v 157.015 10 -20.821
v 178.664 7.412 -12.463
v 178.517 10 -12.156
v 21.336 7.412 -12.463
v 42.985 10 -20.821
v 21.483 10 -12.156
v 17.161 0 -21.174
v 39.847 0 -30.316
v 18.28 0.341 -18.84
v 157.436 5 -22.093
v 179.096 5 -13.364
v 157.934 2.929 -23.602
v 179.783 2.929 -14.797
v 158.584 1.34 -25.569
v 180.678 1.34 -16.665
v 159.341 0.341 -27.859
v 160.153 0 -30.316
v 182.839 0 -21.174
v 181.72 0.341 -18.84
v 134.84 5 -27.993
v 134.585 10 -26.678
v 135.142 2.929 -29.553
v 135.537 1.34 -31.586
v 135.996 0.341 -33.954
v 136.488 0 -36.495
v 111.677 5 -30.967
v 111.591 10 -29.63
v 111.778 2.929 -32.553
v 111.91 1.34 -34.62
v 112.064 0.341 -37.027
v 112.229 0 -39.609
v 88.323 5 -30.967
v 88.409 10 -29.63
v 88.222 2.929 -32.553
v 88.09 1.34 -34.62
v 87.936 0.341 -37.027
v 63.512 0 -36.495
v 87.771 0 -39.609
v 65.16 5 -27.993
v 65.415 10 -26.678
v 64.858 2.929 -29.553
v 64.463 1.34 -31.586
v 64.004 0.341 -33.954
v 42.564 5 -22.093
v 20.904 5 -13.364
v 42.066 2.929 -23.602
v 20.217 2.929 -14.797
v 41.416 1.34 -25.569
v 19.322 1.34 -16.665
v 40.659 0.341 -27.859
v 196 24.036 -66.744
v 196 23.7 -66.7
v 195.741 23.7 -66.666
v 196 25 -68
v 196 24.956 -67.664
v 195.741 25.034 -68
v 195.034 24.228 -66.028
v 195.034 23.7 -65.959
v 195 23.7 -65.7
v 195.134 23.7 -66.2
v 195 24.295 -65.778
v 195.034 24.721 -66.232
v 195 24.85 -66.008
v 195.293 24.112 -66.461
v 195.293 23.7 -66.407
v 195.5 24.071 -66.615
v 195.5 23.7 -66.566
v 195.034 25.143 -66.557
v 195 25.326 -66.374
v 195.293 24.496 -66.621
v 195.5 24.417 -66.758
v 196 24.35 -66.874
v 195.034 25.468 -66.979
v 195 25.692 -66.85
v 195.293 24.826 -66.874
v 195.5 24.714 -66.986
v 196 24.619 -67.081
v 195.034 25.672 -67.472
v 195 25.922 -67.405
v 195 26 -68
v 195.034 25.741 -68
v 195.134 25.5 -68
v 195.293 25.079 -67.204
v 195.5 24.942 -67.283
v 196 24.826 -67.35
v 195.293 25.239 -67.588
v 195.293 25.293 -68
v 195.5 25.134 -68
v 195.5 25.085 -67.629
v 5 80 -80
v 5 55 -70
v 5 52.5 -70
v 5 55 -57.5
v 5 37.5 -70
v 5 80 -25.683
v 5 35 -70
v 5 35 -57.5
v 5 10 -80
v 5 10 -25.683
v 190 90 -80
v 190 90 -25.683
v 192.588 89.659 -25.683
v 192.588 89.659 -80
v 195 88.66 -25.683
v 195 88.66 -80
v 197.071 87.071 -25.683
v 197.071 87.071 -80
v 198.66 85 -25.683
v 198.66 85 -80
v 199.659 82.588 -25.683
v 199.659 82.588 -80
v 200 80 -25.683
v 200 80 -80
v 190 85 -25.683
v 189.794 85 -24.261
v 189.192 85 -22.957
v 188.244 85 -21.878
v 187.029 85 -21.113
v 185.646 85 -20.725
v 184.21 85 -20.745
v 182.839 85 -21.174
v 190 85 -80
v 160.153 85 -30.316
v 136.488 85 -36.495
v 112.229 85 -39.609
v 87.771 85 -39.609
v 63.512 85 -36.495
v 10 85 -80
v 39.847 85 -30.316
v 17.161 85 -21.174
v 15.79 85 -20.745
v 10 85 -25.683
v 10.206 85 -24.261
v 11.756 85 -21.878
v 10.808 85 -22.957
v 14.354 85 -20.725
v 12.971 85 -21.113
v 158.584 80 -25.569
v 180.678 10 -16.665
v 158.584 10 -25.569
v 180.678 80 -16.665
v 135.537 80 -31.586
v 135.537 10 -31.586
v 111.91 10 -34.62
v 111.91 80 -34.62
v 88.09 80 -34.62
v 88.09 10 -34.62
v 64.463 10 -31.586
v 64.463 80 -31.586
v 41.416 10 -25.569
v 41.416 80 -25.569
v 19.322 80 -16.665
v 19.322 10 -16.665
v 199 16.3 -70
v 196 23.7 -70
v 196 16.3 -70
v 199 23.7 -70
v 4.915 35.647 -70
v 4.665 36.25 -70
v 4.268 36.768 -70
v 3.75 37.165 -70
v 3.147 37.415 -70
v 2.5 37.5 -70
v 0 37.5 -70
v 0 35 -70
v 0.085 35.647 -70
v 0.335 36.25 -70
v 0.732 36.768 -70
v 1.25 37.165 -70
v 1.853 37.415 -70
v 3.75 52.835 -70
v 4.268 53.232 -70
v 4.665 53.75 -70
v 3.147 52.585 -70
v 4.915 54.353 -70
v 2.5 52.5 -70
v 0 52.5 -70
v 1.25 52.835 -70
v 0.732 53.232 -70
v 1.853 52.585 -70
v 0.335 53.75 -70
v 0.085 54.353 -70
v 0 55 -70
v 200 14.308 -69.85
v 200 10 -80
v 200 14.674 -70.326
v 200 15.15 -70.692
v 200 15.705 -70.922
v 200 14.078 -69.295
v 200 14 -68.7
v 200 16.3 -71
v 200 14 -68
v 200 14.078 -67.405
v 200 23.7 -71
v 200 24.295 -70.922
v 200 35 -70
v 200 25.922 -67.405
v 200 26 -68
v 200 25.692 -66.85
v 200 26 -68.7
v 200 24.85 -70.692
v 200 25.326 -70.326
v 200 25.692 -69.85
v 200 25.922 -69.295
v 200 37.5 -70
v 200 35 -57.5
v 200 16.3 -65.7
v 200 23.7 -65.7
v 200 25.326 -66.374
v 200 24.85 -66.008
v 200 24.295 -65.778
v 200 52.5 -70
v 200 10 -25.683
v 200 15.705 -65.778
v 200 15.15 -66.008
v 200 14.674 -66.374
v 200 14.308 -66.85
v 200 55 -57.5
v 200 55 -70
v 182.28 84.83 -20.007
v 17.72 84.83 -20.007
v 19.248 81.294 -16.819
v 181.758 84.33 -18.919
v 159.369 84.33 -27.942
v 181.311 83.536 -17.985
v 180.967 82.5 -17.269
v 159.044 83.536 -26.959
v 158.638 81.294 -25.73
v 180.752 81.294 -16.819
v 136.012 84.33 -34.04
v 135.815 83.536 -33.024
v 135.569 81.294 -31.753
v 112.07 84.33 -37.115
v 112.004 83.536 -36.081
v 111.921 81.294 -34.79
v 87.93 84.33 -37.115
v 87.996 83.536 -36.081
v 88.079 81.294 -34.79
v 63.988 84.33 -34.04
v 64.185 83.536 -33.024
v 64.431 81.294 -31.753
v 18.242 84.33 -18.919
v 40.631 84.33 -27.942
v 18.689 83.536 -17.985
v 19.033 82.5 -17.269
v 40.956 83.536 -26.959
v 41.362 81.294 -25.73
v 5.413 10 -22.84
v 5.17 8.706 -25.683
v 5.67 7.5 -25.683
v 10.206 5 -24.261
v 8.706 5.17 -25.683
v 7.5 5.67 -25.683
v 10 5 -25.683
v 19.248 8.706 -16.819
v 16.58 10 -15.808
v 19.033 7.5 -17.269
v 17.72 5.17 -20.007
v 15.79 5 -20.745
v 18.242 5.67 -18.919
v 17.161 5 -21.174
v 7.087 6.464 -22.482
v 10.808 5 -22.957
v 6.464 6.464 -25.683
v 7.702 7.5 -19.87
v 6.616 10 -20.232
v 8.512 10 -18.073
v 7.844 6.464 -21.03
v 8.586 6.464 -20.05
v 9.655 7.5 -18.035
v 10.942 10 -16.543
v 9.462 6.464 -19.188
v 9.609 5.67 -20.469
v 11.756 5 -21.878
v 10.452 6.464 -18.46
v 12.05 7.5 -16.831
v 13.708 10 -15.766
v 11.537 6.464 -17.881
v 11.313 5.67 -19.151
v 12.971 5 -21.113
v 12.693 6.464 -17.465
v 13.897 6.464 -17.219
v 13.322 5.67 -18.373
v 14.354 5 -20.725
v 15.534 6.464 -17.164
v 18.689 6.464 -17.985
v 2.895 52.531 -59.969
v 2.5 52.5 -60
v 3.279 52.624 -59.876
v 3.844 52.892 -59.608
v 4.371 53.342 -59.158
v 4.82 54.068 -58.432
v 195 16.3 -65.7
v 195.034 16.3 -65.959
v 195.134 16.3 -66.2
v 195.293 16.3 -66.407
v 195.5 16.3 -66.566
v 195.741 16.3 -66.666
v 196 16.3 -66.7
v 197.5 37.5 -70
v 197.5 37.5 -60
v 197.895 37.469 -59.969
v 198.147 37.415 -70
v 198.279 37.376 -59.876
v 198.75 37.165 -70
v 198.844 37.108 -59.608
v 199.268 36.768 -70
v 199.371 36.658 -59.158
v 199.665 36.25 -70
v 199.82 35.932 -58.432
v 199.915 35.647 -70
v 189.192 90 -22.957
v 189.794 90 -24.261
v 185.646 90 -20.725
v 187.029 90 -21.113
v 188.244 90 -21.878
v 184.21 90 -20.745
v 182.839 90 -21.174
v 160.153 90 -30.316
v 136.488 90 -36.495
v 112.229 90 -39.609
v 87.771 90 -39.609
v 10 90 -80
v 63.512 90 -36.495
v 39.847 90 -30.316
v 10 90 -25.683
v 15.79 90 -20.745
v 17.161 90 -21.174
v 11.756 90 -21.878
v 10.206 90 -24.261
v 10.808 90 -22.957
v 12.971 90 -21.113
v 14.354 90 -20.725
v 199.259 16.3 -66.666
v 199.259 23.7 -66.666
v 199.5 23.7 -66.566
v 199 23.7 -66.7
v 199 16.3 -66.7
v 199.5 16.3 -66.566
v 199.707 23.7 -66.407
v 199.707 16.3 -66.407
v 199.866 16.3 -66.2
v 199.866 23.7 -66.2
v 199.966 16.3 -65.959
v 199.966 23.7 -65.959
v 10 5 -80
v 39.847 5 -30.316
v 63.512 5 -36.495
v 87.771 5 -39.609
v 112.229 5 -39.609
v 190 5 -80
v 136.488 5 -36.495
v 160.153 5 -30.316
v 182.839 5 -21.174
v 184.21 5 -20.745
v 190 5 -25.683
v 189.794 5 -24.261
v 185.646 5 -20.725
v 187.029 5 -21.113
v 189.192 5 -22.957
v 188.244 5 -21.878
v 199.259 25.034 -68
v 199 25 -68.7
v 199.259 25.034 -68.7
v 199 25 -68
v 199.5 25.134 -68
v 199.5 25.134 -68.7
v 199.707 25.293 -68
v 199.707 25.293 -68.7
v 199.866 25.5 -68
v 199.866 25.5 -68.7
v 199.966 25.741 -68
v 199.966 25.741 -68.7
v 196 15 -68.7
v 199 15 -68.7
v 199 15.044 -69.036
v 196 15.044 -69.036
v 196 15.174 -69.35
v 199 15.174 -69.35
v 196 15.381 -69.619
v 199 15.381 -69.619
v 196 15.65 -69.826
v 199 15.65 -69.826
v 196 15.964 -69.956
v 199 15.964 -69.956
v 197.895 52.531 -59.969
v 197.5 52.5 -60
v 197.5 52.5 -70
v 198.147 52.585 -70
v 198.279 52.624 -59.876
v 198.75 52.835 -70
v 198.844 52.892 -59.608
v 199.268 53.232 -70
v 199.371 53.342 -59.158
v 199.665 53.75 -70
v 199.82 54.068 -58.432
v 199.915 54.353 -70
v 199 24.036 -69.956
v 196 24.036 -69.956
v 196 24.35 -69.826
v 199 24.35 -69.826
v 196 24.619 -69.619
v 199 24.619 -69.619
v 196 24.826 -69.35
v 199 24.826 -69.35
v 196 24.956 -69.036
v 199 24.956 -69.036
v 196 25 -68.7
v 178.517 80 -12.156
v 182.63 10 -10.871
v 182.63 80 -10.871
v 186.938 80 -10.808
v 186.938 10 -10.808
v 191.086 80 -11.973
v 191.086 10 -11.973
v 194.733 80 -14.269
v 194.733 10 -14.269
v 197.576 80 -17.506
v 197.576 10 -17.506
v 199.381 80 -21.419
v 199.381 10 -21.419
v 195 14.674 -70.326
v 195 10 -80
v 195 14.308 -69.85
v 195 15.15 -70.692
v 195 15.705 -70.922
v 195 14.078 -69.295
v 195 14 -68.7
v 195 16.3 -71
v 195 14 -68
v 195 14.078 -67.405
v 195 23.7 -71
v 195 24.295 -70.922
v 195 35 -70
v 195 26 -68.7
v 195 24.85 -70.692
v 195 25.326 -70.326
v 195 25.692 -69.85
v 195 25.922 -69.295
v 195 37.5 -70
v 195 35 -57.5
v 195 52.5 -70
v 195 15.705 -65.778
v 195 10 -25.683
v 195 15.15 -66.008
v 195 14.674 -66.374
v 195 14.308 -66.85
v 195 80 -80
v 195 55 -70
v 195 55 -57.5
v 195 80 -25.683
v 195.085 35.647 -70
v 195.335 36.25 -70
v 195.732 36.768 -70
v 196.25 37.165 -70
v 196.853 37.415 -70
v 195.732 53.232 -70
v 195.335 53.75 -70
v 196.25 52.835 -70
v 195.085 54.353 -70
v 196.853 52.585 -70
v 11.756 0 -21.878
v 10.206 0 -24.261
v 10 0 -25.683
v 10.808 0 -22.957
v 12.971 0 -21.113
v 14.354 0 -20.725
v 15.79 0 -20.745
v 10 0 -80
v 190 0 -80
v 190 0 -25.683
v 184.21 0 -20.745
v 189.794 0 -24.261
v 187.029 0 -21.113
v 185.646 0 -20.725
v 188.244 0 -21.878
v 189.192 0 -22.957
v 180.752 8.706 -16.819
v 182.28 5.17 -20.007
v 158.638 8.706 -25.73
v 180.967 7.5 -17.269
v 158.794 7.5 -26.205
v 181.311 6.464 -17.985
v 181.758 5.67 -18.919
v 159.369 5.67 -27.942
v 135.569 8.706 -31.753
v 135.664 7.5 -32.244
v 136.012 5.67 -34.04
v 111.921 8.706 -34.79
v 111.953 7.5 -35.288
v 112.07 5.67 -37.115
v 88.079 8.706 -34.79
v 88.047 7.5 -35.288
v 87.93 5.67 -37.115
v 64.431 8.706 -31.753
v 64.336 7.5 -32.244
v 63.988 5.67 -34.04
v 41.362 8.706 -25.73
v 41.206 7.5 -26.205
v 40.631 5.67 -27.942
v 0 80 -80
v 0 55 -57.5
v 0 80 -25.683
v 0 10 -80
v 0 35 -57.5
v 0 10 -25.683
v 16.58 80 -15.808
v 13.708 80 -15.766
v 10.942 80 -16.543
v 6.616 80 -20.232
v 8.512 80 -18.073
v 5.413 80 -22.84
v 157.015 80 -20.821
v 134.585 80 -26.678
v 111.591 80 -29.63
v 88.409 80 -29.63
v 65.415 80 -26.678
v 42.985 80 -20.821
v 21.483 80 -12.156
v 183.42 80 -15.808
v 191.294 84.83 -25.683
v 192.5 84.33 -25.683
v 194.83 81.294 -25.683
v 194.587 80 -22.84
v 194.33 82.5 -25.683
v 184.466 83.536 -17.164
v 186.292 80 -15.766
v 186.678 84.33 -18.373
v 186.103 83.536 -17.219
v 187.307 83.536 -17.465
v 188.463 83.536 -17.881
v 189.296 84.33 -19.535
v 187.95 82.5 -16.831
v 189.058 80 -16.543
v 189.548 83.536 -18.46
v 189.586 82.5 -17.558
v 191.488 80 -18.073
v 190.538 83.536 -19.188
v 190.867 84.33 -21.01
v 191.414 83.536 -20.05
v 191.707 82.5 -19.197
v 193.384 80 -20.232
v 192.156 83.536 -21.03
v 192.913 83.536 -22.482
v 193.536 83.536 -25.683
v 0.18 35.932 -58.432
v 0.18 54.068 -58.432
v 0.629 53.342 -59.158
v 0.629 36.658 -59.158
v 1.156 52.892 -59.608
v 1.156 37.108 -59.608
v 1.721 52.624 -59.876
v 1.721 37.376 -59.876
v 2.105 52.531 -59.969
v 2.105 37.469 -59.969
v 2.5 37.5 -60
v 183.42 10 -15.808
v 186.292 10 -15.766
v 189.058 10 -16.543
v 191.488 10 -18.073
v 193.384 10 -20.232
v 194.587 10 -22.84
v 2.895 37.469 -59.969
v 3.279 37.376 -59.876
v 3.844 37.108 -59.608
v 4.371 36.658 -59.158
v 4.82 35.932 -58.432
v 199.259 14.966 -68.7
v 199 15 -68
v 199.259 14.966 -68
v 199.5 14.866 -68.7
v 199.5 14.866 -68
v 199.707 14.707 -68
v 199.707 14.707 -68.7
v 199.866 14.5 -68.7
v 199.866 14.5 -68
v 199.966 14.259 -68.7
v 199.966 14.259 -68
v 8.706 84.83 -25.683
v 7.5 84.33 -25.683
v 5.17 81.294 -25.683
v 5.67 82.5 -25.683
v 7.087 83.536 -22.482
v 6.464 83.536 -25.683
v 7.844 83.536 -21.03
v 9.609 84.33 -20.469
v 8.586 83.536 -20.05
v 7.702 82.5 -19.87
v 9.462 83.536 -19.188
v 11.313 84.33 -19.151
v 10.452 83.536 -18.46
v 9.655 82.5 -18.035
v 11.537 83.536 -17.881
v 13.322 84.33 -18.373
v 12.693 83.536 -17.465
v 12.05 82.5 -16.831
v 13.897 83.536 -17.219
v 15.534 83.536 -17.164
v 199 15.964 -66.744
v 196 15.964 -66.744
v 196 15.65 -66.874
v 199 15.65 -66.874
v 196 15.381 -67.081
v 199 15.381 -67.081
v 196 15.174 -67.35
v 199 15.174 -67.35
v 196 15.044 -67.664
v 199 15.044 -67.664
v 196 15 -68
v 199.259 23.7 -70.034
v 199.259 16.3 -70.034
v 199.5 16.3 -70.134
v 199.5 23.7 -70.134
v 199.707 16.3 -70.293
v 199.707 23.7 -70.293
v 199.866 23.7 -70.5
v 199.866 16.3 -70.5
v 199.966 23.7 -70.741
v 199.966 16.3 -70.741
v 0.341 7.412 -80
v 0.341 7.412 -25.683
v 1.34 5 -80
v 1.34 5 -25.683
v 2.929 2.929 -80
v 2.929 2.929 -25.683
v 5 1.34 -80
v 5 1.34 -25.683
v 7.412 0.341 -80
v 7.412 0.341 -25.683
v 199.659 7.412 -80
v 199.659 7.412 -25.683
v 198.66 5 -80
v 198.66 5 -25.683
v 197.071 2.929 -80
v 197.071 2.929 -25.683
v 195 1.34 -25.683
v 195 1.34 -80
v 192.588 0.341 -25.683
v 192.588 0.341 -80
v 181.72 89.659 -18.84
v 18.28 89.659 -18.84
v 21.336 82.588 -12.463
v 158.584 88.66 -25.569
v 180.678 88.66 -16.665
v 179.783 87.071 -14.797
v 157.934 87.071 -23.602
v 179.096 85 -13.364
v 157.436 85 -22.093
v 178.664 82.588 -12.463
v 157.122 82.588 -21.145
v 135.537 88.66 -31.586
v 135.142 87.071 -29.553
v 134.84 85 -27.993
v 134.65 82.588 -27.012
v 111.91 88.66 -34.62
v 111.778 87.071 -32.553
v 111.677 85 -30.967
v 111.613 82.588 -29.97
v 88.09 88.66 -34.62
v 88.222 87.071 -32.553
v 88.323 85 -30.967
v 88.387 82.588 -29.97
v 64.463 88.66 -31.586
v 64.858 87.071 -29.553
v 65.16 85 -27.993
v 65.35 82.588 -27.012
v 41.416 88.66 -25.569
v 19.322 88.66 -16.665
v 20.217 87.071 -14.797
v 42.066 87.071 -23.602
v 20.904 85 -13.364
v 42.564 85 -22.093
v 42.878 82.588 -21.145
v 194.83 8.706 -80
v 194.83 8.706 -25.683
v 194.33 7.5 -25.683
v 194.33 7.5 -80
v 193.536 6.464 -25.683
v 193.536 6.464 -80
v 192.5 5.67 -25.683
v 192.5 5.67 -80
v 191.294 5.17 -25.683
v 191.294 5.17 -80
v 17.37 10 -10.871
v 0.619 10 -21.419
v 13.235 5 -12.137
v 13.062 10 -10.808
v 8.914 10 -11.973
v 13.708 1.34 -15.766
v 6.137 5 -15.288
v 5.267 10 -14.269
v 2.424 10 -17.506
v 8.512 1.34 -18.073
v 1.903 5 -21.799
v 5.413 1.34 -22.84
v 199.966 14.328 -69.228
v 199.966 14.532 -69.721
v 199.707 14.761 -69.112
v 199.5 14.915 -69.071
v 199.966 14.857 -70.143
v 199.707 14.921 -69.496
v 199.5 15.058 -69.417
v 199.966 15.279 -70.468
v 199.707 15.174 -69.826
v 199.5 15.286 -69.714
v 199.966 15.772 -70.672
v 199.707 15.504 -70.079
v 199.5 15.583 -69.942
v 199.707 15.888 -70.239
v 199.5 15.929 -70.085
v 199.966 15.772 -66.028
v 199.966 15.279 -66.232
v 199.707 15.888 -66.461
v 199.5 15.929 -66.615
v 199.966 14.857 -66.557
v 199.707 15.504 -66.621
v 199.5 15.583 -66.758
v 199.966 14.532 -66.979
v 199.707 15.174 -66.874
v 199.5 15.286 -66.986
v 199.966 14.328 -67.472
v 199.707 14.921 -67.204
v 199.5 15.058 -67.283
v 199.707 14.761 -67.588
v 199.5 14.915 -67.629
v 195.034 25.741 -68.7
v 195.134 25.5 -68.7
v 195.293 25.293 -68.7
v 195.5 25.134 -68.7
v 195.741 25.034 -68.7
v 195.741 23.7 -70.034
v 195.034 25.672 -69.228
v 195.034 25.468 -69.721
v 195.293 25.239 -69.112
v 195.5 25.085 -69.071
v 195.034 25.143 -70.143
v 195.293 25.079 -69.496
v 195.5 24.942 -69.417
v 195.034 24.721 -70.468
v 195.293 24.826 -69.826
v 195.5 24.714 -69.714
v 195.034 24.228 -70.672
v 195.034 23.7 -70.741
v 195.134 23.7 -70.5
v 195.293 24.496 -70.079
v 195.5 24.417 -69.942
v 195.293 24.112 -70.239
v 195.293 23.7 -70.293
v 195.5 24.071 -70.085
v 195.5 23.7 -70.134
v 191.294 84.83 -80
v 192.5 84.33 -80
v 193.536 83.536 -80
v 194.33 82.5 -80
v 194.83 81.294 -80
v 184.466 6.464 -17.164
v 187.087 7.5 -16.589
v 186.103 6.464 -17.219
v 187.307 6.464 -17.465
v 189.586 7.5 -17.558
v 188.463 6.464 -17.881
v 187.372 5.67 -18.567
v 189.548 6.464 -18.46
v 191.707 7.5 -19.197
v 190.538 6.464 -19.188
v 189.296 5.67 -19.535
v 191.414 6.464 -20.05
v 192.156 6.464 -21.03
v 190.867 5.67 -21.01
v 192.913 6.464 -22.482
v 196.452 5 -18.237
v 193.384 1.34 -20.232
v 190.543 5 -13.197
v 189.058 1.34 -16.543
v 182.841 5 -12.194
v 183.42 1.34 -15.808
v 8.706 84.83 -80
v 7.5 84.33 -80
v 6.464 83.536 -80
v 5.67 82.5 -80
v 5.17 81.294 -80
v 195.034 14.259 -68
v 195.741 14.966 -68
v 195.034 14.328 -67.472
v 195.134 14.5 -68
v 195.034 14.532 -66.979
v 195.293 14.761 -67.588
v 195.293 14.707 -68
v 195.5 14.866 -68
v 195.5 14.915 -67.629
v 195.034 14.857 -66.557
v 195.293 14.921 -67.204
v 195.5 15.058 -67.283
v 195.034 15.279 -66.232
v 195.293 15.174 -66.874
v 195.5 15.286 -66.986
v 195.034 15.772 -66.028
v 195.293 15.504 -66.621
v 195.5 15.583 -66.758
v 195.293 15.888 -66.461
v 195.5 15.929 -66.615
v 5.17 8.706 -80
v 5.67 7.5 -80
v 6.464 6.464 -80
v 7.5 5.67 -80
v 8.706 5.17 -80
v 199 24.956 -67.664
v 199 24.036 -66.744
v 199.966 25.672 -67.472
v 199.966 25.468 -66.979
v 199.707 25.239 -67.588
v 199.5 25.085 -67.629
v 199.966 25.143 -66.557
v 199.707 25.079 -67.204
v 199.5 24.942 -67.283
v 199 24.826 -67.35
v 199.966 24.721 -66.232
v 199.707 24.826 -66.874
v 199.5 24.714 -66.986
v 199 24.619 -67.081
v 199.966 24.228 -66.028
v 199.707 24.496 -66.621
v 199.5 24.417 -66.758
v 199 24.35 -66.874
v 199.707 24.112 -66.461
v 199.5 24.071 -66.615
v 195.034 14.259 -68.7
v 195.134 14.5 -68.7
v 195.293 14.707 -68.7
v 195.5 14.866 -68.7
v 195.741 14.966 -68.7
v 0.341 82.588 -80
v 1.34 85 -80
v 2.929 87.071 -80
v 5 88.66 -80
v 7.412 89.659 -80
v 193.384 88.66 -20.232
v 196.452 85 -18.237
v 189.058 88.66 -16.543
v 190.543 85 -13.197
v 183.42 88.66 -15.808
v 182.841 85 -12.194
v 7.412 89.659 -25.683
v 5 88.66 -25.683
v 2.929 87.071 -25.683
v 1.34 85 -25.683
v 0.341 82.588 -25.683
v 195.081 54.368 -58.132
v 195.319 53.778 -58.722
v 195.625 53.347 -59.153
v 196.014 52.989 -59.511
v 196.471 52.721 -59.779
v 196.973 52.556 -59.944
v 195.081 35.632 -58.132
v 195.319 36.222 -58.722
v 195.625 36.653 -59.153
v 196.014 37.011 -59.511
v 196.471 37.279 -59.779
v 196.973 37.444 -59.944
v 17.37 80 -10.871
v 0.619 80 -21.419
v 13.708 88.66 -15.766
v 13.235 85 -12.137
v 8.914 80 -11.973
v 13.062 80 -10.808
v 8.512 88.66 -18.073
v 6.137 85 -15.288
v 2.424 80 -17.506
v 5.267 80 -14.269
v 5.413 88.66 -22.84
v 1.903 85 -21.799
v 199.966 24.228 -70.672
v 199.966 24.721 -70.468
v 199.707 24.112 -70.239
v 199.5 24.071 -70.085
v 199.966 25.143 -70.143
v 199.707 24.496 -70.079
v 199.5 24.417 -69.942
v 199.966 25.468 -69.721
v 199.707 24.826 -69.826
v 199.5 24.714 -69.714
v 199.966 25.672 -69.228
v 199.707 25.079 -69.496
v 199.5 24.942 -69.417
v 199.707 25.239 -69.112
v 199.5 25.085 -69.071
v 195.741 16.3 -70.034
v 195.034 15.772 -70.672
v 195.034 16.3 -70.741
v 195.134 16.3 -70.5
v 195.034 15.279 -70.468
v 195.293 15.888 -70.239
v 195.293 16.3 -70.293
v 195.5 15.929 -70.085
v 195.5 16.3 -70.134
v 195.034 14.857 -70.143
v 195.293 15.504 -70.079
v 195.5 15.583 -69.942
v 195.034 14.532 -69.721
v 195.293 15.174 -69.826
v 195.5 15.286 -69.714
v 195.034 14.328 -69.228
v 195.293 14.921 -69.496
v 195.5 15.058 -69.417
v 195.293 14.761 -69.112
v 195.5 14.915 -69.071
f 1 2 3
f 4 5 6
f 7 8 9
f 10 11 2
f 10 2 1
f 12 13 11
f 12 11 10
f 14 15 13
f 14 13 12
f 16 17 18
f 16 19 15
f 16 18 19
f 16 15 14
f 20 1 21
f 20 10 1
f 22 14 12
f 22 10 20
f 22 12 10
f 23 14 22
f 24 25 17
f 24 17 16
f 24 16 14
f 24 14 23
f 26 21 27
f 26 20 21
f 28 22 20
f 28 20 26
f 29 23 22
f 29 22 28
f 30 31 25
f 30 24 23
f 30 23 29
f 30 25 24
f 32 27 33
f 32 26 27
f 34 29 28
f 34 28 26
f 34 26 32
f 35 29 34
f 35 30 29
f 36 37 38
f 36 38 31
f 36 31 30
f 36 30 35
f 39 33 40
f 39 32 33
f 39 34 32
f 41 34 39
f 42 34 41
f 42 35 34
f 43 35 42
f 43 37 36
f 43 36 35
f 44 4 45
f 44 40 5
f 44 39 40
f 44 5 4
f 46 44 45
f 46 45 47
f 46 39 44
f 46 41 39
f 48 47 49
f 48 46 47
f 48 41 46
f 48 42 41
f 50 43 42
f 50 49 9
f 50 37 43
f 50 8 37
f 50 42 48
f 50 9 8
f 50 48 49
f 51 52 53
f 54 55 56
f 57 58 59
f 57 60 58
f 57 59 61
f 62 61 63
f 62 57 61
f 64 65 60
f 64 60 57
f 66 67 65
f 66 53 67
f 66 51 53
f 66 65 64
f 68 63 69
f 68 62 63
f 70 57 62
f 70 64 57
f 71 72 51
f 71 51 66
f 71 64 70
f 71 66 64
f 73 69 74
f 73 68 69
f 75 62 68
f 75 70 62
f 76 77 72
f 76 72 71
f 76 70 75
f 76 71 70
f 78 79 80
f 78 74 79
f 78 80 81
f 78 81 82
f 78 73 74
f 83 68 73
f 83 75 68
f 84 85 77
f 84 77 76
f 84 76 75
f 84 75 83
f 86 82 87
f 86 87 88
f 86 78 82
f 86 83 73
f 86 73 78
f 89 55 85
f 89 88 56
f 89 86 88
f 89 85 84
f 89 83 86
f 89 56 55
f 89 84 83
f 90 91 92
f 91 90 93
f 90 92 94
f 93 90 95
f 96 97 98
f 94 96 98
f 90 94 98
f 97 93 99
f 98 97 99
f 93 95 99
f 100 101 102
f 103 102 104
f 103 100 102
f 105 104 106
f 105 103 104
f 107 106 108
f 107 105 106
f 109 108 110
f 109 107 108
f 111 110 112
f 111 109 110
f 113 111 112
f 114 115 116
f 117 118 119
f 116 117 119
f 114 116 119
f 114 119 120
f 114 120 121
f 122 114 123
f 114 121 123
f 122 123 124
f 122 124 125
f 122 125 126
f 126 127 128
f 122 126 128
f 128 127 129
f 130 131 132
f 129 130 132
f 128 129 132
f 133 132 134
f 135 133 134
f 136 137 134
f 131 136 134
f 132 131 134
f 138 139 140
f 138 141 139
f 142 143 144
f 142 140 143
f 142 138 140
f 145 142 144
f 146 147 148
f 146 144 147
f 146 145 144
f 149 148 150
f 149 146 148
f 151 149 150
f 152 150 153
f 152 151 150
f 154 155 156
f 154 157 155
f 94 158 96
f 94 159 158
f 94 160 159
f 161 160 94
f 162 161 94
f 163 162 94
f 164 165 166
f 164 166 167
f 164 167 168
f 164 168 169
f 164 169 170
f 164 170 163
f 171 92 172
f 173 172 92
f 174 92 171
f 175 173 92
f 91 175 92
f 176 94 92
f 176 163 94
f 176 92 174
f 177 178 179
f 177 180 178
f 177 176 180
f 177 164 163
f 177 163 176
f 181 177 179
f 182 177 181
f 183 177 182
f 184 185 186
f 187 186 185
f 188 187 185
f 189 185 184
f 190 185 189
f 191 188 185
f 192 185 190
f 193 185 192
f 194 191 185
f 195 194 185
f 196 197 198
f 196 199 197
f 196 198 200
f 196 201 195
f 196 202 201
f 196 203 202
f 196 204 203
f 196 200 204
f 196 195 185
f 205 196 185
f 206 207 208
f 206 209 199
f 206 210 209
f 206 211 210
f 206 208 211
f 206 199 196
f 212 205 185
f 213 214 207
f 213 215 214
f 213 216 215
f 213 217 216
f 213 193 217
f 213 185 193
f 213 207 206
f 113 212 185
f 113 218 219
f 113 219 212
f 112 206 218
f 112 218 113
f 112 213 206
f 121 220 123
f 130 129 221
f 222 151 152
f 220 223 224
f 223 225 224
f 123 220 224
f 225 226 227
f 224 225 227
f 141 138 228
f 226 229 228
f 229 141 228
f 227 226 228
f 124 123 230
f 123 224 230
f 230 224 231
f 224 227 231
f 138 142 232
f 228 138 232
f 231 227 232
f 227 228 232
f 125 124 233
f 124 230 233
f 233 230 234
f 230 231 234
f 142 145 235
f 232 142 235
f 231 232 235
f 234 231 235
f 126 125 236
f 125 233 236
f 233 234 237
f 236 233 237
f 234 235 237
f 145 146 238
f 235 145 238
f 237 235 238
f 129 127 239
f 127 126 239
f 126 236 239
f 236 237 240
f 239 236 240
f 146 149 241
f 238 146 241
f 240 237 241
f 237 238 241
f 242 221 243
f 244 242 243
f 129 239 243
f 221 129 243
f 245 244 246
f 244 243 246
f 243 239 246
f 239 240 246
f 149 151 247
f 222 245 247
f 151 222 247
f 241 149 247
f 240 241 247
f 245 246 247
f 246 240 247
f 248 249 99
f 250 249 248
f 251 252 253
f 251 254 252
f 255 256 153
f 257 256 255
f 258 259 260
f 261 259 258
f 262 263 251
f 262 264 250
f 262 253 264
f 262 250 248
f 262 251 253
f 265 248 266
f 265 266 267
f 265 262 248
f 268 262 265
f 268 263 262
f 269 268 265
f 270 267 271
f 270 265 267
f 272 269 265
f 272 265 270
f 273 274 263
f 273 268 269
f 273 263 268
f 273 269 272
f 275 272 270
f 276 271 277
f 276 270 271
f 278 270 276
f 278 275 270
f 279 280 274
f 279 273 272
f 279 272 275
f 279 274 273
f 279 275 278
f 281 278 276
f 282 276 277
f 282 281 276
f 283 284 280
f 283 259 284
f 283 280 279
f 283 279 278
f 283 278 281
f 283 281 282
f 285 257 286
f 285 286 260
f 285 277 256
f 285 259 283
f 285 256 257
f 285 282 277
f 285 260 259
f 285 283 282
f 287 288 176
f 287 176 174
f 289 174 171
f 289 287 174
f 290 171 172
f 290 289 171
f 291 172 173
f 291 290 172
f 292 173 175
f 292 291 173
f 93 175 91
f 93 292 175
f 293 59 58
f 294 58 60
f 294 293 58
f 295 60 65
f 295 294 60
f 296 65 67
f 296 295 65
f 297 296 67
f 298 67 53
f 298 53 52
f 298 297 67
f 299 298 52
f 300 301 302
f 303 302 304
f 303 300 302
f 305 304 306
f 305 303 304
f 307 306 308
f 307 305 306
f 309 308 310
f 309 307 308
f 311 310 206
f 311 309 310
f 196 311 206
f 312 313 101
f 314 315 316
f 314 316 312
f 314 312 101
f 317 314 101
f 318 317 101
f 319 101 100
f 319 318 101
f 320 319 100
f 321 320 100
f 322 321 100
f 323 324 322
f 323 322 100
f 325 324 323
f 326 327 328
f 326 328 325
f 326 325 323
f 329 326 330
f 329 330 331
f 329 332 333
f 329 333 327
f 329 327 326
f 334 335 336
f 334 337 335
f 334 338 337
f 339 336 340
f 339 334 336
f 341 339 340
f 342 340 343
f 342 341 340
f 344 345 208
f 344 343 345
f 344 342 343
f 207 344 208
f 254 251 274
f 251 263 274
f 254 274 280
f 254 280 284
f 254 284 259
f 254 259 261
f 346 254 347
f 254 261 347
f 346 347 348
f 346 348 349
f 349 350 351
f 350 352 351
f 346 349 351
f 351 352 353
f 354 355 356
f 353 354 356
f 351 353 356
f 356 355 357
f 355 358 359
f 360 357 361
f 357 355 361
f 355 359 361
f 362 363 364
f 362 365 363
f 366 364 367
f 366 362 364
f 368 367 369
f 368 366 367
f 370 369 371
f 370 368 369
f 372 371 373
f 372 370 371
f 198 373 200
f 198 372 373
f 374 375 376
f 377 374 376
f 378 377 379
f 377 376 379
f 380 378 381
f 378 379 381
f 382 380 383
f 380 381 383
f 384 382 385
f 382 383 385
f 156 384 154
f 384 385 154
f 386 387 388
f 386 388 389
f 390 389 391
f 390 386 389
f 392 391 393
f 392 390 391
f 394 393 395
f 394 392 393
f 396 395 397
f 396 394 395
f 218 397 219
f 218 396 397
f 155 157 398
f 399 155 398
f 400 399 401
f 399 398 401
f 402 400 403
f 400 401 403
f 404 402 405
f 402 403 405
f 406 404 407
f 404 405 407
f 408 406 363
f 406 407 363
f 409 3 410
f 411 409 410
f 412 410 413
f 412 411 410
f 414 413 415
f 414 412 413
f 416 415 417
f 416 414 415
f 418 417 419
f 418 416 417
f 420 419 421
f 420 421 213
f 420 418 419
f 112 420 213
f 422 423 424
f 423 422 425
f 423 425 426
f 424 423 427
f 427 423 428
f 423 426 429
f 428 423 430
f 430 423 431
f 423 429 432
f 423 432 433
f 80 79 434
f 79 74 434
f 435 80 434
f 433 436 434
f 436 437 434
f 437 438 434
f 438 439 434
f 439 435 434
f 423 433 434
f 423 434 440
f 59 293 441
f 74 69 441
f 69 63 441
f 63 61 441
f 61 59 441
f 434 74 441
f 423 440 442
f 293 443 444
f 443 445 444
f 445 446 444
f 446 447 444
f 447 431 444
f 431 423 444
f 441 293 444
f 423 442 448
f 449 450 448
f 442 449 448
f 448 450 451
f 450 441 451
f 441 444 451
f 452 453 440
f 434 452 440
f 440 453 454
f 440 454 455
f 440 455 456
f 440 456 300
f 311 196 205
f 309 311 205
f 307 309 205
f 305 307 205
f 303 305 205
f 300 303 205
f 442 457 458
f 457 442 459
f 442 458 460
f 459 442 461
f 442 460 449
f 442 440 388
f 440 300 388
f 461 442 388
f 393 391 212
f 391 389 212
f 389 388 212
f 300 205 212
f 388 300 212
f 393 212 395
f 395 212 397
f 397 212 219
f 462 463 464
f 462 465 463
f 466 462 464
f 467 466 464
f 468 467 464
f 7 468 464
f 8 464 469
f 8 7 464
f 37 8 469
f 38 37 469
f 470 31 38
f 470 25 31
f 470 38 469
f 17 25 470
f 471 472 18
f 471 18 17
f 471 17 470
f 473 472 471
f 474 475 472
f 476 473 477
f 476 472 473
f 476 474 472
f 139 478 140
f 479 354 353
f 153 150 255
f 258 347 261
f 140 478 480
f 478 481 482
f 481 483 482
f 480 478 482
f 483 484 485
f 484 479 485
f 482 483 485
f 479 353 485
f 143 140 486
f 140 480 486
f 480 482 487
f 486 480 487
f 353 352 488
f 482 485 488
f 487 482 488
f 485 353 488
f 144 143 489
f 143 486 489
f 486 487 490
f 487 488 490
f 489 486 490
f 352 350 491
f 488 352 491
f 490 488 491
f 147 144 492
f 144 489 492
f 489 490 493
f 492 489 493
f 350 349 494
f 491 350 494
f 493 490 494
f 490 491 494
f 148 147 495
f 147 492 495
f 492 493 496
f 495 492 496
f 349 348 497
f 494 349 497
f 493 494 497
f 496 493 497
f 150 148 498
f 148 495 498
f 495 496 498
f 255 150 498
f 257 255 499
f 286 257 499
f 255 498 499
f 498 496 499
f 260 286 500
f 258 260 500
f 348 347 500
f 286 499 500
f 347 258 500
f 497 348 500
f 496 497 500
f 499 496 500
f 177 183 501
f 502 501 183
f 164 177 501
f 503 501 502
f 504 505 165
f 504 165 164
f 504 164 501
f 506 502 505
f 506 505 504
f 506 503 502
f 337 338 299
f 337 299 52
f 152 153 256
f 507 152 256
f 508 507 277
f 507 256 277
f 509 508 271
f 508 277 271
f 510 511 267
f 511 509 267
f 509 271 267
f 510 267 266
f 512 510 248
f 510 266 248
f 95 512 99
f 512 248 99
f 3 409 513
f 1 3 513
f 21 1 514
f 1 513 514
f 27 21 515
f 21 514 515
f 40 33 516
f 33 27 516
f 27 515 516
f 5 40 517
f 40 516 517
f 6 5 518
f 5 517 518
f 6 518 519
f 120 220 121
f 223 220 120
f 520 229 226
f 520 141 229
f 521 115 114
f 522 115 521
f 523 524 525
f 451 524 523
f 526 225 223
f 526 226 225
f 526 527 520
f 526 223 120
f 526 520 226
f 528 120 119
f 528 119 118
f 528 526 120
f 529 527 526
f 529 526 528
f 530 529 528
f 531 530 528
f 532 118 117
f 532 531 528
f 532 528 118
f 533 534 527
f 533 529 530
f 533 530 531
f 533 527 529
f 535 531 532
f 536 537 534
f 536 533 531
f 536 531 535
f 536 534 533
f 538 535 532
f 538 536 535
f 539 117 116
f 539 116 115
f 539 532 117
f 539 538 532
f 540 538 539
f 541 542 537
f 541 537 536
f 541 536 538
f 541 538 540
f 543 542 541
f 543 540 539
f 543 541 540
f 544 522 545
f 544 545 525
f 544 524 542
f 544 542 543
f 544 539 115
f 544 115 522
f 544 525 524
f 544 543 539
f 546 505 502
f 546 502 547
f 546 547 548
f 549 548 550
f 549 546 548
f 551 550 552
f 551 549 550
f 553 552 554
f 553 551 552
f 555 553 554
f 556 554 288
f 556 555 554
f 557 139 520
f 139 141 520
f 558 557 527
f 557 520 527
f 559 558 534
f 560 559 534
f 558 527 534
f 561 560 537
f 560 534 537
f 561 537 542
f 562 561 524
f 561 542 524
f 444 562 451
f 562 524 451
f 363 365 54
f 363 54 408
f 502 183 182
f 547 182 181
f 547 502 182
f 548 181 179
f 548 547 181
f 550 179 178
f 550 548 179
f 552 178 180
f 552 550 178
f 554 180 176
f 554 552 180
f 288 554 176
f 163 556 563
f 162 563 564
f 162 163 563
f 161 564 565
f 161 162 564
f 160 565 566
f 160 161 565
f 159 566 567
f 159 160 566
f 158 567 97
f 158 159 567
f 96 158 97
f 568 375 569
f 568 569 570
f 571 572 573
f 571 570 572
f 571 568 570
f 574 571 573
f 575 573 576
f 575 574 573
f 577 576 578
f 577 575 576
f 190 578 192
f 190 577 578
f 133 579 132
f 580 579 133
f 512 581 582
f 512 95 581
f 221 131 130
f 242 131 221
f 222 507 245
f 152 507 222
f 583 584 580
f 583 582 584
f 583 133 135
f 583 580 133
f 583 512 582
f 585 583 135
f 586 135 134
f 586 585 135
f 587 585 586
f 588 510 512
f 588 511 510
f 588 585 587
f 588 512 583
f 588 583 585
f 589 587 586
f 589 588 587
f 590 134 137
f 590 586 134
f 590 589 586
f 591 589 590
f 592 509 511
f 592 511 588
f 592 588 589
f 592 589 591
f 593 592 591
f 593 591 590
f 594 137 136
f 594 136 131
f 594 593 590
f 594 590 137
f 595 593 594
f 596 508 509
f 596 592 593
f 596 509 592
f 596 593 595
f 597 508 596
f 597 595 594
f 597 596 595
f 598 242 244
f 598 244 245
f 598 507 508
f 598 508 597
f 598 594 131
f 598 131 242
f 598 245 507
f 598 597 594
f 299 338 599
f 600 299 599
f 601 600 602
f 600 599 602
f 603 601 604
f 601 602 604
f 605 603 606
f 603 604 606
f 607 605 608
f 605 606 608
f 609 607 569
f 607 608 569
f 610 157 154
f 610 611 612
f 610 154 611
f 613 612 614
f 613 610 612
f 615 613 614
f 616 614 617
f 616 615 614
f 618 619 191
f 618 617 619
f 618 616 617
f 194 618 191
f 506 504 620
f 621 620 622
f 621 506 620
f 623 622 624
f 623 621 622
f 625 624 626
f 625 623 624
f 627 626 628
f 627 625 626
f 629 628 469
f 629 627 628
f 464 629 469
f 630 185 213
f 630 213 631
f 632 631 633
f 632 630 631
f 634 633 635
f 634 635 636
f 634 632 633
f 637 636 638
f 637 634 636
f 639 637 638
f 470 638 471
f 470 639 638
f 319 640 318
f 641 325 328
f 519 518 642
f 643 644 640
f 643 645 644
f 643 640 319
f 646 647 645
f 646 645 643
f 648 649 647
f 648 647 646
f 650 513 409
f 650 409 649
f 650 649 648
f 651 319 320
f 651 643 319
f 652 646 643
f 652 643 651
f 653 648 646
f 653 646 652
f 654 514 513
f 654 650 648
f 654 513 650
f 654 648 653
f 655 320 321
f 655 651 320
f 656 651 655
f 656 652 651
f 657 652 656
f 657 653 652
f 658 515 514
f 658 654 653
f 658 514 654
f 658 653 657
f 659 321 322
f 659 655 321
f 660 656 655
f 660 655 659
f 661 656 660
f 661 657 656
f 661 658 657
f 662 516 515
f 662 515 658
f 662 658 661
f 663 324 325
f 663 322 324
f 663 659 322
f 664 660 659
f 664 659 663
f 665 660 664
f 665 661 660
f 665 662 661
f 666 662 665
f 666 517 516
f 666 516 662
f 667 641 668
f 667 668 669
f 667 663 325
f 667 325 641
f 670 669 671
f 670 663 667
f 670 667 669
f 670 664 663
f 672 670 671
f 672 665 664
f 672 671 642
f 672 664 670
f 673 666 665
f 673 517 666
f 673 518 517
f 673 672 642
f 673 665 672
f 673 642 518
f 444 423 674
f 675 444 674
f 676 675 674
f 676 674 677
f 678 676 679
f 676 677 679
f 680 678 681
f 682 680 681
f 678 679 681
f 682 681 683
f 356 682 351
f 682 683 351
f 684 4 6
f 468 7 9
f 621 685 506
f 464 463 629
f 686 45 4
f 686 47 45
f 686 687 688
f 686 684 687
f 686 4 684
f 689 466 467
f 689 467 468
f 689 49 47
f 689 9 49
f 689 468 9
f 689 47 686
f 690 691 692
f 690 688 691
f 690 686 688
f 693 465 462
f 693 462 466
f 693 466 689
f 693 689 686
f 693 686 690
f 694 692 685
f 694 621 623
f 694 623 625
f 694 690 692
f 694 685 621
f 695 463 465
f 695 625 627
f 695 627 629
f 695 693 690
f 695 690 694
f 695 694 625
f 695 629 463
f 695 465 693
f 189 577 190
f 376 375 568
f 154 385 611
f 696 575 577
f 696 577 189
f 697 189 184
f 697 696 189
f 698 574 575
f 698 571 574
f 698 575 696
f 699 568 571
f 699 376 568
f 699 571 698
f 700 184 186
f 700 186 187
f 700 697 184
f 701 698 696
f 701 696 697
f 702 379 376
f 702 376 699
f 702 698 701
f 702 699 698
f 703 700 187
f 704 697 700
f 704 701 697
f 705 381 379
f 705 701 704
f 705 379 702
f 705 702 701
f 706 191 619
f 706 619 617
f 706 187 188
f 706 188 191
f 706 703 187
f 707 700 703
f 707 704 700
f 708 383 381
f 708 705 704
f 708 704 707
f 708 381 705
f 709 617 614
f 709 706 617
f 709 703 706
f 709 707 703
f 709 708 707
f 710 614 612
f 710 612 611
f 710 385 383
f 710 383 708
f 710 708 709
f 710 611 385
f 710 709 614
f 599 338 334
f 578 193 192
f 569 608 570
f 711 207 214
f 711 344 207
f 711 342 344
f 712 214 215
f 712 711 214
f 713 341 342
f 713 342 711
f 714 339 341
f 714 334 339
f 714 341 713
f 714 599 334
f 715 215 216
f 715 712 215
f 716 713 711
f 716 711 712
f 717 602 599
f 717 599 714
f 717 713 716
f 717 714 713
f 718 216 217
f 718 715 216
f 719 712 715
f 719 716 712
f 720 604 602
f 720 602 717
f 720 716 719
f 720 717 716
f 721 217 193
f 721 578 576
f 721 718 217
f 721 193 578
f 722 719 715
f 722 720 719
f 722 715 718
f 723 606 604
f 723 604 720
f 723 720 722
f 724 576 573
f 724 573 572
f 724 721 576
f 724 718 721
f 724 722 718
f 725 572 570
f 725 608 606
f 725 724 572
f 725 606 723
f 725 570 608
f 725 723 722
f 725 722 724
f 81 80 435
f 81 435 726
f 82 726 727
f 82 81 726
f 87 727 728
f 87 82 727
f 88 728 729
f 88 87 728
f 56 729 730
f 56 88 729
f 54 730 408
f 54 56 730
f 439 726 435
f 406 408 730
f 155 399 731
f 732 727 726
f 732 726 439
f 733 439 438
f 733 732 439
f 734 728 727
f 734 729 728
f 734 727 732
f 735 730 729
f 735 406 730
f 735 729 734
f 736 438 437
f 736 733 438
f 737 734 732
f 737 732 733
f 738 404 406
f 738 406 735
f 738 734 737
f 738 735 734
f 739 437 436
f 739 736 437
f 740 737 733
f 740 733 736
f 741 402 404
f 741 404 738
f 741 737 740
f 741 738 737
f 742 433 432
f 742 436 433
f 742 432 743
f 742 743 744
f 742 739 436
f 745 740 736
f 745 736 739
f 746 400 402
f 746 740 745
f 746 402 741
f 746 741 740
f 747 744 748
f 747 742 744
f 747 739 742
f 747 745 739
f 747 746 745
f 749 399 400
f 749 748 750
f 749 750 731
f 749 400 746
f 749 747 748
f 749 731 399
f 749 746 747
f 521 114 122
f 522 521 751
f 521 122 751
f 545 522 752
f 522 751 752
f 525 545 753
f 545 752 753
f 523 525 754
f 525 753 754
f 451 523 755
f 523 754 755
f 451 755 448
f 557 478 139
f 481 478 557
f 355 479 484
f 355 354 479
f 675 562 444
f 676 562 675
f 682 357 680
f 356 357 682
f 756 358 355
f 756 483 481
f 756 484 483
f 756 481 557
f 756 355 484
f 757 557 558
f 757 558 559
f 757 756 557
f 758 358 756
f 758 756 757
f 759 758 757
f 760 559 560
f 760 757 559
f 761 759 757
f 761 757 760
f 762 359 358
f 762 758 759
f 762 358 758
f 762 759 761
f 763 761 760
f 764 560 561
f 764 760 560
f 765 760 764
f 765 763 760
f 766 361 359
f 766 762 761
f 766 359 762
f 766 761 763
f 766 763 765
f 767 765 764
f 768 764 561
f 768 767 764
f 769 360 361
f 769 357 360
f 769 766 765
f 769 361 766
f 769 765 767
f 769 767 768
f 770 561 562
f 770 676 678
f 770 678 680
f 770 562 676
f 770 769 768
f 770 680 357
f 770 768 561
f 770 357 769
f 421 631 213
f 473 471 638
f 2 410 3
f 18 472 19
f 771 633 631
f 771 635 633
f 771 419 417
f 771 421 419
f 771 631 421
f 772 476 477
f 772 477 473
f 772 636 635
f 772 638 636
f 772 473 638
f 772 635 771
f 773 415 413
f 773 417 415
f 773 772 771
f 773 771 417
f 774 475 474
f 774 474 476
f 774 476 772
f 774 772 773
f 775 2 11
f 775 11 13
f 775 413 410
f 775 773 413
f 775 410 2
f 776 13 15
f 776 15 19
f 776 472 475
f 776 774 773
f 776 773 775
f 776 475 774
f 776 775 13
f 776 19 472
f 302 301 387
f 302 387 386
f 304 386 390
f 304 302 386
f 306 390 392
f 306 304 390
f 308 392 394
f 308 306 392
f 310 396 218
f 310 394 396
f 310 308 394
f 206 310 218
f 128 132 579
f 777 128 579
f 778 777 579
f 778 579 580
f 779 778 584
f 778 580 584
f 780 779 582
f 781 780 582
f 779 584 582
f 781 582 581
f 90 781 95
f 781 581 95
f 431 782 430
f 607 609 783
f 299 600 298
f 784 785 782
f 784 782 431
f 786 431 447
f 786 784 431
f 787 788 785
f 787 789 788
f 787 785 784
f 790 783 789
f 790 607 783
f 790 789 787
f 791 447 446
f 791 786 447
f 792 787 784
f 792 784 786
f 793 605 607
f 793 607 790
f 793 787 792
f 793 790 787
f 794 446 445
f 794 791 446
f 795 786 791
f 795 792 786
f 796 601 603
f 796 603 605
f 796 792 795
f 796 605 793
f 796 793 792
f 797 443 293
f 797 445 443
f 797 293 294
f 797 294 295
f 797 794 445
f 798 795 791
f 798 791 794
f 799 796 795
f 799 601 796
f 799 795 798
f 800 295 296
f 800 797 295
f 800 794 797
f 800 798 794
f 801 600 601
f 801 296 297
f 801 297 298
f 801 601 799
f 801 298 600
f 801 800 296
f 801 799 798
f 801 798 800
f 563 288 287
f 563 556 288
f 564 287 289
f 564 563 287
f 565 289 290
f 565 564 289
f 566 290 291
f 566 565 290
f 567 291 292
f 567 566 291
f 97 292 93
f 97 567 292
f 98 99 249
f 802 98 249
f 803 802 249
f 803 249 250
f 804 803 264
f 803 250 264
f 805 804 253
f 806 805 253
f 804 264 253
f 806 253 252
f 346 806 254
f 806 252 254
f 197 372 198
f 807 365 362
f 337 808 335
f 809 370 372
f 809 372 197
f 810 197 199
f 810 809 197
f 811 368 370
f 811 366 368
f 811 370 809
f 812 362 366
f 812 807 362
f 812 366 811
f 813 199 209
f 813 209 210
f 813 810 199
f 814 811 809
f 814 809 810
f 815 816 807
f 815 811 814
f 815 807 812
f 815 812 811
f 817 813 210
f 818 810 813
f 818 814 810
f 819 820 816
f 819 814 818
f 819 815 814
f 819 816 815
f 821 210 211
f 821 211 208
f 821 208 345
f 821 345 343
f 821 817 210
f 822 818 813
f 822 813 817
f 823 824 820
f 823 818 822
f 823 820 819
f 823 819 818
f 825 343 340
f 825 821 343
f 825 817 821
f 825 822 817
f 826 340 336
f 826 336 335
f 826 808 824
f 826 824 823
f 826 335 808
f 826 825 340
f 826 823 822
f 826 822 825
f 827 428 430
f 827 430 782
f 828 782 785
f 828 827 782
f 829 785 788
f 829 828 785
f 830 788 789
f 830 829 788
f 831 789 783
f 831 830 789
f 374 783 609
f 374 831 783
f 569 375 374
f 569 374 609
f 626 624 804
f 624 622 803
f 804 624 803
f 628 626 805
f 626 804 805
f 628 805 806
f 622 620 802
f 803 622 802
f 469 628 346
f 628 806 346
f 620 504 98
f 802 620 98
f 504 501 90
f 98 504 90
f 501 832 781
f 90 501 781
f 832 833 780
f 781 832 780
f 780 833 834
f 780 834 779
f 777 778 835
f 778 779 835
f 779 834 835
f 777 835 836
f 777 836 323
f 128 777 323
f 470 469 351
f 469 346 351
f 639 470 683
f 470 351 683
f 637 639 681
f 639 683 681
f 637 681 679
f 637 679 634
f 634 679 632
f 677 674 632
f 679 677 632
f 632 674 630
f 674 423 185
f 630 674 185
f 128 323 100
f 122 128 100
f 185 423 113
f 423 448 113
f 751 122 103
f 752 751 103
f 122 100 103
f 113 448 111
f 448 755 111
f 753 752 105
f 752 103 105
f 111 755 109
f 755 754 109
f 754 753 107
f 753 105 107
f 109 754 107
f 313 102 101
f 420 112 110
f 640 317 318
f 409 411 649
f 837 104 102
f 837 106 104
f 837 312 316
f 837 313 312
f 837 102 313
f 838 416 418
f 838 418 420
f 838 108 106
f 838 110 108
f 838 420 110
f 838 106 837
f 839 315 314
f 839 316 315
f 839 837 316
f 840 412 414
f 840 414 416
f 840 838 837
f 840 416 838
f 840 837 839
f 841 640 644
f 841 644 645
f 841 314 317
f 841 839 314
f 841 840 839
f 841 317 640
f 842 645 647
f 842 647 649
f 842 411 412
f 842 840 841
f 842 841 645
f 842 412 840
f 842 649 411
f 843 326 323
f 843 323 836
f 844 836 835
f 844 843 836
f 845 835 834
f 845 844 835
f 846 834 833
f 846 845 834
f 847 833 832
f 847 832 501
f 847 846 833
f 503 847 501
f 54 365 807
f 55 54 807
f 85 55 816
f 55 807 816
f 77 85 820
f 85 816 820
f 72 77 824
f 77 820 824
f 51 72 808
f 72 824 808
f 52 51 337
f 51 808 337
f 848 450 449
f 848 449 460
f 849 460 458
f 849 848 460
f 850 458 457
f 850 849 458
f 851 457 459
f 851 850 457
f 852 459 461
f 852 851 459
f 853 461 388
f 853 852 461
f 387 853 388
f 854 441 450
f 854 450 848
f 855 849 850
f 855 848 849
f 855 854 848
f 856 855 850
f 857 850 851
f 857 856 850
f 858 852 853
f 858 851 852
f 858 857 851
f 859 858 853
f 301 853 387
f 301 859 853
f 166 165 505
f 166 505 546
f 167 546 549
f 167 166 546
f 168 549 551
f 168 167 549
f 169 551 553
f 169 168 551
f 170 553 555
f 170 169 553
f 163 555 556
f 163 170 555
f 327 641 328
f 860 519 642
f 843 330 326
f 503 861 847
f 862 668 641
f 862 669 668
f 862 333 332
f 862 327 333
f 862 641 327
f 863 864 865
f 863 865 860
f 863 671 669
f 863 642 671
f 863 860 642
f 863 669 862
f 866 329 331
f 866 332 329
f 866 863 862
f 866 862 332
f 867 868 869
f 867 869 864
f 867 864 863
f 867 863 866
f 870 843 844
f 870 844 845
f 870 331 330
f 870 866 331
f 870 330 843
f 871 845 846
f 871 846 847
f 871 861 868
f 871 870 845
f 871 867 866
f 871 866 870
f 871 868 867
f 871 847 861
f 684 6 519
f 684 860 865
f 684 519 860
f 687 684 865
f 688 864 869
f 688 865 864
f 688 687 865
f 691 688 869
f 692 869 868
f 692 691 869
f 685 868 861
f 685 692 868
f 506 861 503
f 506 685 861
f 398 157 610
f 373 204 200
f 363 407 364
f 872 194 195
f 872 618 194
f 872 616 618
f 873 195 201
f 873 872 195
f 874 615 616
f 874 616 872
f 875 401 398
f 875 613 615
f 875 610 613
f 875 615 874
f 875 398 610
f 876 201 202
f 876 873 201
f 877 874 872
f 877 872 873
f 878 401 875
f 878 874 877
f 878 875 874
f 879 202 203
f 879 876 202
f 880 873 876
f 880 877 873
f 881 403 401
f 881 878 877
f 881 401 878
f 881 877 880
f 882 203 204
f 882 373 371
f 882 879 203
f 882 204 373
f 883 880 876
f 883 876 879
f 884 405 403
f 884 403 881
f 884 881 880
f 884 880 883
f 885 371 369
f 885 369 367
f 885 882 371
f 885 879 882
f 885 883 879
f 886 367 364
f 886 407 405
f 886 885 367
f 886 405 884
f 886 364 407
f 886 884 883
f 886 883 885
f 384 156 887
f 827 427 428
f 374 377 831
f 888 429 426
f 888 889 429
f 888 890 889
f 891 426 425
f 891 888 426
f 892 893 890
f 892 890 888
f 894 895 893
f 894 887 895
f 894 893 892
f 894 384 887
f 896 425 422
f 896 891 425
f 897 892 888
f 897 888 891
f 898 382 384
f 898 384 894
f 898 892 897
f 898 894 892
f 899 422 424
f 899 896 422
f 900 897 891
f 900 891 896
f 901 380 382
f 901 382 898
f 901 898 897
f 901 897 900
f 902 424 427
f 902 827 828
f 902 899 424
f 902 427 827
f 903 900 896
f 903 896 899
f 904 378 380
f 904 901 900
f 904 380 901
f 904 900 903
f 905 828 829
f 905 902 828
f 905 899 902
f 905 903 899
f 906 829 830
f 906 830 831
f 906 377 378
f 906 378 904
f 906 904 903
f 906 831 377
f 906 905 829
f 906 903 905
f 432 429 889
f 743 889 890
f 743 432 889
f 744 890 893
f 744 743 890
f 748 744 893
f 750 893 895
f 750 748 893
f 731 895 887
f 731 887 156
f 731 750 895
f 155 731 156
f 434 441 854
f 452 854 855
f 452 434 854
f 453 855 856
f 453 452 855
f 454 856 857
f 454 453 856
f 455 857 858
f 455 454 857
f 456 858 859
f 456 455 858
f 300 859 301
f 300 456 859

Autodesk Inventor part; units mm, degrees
ref_plane "YZ Plane" through (0, 0, 0) normal (1, 0, 0) x (0, 1, 0)
ref_plane "XZ Plane" through (0, 0, 0) normal (0, 1, 0) x (-1, 0, 0)
ref_plane "XY Plane" through (0, 0, 0) normal (0, 0, 1) x (1, 0, 0)
sketch "Sketch1" plane through (0, 0, 0) normal (0, 0, 1) x (1, 0, 0)
  line L0 (0, 0) -> (200, 0)
  line L1 (200, 0) -> (200, 90)
  line L2 (200, 90) -> (0, 90)
  line L3 (0, 90) -> (0, 0)
  dimension "d0" = 200
  dimension "d1" = 90
extrude "Extrusion1" add sketch "Sketch1" against normal blind 80
sketch "Sketch2" plane through (0, 90, 0) normal (0, 1, 0) x (1, 0, 0)
  line L0 (200, 0) -> (0, 0) projected
  line L1 (200, 0) -> (200, 80) projected
  line L2 (0, 80) -> (200, 80) projected
  line L3 (0, 0) -> (0, 80) projected
  circle A0 centre (100, 0) radius 30
  arc A1 (200, 0) -> (0, 0) centre (100, -151.6667) ccw
  dimension "d4" = 60
extrude "Extrusion2" cut sketch "Sketch2" against normal blind 100 contours L0 A0 A1 | L0 A0 | A0 L0 A1 picked at (94.9216, 15.5737)
fillet "Fillet1" radius 15 2 edges at (200, 45, 0) (0, 45, 0)
sketch "Sketch3" plane through (200, 0, -80) normal (1, 0, 0) x (0, 0, -1)
  line L0 (-80, 0) -> (-80, 90) projected
  line L1 (-80, 0) -> (0, 0) projected
  line L2 (0, 90) -> (0, 0) projected
  line L3 (-80, 90) -> (0, 90) projected
  line L4 (-12, 25) -> (-11.3, 25)
  line L5 (-10, 23.7) -> (-10, 16.3)
  line L6 (-11.3, 15) -> (-12, 15)
  line L7 (-13.3, 16.3) -> (-13.3, 23.7)
  arc A0 (-12, 25) -> (-13.3, 23.7) centre (-12, 23.7) ccw
  arc A1 (-10, 23.7) -> (-11.3, 25) centre (-11.3, 23.7) ccw
  arc A2 (-11.3, 15) -> (-10, 16.3) centre (-11.3, 16.3) ccw
  arc A3 (-13.3, 16.3) -> (-12, 15) centre (-12, 16.3) ccw
  point P0 (-10, 15)
  point P1 (-10, 25)
  point P2 (-13.3, 15)
  point P3 (-11.65, 15)
  dimension "d8" = 3.3
  dimension "d9" = 10
  dimension "d10" = 1.3
  dimension "d11" = 10
  dimension "d12" = 15
fillet "Fillet3" radius 10 10 edges at (7.0077, 0, -12.9892) (0, 0, -52.8413) (192.9923, 0, -12.9892) (200, 0, -52.8413) (100, 0, -30) (192.9923, 90, -12.9892) (200, 90, -52.8413) (7.0077, 90, -12.9892) (0, 90, -52.8413) (100, 90, -30)
shell "Shell2" thickness 5 removed faces 1 at (130, 30, -80)
extrude "Extrusion4" cut sketch "Sketch3" against normal blind 100 contours L4 A1 L5 A2 L6 A3 L7 A0
fillet "Fillet4" radius 1 16 edges at (200, 24.6192, -67.0808) (200, 25, -68.35) (200, 24.6192, -69.6192) (200, 20, -70) (200, 15.3808, -69.6192) (200, 15, -68.35) (200, 15.3808, -67.0808) (200, 20, -66.7) (195, 15.3808, -67.0808) (195, 15, -68.35) (195, 15.3808, -69.6192) (195, 20, -70) (195, 24.6192, -69.6192) (195, 25, -68.35) (195, 24.6192, -67.0808) (195, 20, -66.7)
sketch "Sketch6" plane through (200, 10, -25.6826) normal (1, 0, 0) x (0, 0, -1)
  line L0 (0, 70) -> (54.3174, 70) projected
  line L1 (0, 0) -> (0, 70) projected
  line L2 (54.3174, 0) -> (0, 0) projected
  line L3 (54.3174, 70) -> (54.3174, 0) projected
  arc A0 (42.3174, 16) -> (40.0174, 13.7) centre (42.3174, 13.7) ccw projected
  line L4 (43.0174, 16) -> (42.3174, 16) projected
  arc A1 (45.3174, 13.7) -> (43.0174, 16) centre (43.0174, 13.7) ccw projected
  line L5 (45.3174, 6.3) -> (45.3174, 13.7) projected
  arc A2 (43.0174, 4) -> (45.3174, 6.3) centre (43.0174, 6.3) ccw projected
  line L6 (42.3174, 4) -> (43.0174, 4) projected
  arc A3 (40.0174, 6.3) -> (42.3174, 4) centre (42.3174, 6.3) ccw projected
  line L7 (40.0174, 13.7) -> (40.0174, 6.3) projected
  line L8 (44.3174, 42.5) -> (34.3174, 42.5)
  line L9 (34.3174, 42.5) -> (34.3174, 27.5)
  line L10 (34.3174, 27.5) -> (44.3174, 27.5)
  line L11 (44.3174, 27.5) -> (44.3174, 42.5)
  point P0 (-25.6826, -10)
  point P1 (44.3174, 35)
  point P2 (54.3174, 35)
  dimension "d32" = 10
  dimension "d33" = 15
  dimension "d34" = 10
extrude "Extrusion7" cut sketch "Sketch6" against normal blind 5 contours L11 L10 L9 L8
sketch "Sketch7" plane through (0, 10, -80) normal (-1, 0, 0) x (0, 0, 1)
  line L0 (0, 70) -> (54.3174, 70) projected
  line L1 (0, 0) -> (0, 70) projected
  line L2 (54.3174, 0) -> (0, 0) projected
  line L3 (54.3174, 70) -> (54.3174, 0) projected
  line L4 (10, 42.5) -> (20, 42.5)
  line L5 (20, 42.5) -> (20, 27.5)
  line L6 (20, 27.5) -> (10, 27.5)
  line L7 (10, 27.5) -> (10, 42.5)
  point P0 (80, -10)
  point P1 (10, 35)
  point P2 (0, 35)
  dimension "d37" = 10
  dimension "d38" = 15
  dimension "d39" = 10
extrude "Extrusion8" cut sketch "Sketch7" against normal blind 5 contours L4 L5 L6 L7
fillet "Fillet5" radius 2.5 12 edges at (195, 45, -60) (195, 52.5, -65) (195, 37.5, -65) (200, 45, -60) (200, 37.5, -65) (200, 52.5, -65) (0, 45, -60) (5, 45, -60) (5, 52.5, -65) (0, 52.5, -65) (0, 37.5, -65) (5, 37.5, -65)
properties part number "BatPackCase_3DPrint"
